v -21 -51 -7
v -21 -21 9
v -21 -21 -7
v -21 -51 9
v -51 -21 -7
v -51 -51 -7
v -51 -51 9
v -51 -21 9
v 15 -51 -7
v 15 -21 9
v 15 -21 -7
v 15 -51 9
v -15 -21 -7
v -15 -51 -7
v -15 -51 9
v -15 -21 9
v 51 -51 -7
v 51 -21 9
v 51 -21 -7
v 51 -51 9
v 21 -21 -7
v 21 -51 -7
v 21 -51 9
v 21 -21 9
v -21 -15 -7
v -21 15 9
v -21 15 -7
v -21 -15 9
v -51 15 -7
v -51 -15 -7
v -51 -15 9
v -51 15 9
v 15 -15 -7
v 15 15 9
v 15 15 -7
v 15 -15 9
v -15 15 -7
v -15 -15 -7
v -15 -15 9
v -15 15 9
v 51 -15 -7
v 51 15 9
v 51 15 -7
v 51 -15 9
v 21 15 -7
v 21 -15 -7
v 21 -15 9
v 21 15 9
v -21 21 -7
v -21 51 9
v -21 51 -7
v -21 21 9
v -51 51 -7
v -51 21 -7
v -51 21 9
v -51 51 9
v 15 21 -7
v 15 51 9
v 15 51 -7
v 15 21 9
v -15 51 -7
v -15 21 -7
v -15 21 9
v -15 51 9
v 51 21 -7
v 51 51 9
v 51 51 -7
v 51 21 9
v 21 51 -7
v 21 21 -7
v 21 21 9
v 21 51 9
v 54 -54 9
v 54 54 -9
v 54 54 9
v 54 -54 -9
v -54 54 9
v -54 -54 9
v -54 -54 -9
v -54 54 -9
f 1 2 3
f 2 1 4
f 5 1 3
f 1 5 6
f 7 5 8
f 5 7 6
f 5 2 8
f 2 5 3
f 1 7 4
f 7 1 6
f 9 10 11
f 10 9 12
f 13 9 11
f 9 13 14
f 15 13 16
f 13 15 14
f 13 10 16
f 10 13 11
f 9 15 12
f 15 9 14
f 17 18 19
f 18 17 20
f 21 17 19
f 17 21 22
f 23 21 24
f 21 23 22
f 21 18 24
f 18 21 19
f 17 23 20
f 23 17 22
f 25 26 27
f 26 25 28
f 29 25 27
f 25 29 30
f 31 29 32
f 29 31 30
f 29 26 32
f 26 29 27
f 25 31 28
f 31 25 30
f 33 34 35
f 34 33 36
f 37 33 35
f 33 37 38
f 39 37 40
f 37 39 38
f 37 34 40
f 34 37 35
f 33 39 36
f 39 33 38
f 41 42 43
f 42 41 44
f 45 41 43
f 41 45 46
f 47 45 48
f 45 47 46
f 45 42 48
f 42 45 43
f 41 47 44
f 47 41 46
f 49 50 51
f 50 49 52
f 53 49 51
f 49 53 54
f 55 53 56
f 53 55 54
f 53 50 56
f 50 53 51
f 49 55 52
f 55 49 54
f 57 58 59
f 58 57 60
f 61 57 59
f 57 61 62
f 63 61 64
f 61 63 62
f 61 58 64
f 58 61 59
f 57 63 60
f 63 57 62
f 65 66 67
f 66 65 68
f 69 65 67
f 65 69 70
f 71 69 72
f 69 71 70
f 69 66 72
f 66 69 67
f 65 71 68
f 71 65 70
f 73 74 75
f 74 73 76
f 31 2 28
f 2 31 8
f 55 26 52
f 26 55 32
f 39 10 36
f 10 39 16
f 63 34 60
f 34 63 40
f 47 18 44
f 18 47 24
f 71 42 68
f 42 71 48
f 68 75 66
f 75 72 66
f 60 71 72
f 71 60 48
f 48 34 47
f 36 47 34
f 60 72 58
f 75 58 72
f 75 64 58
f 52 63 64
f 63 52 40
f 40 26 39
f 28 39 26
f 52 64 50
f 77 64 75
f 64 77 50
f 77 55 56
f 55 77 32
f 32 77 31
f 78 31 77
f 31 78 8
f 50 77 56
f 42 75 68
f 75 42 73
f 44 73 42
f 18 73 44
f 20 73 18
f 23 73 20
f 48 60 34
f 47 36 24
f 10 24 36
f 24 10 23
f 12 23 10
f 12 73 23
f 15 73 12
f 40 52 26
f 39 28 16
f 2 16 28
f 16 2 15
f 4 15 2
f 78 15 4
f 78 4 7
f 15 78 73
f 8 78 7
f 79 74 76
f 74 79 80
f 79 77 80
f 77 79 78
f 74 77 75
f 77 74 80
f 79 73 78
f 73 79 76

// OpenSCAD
$fn = 32;

// ----------------------------------------------------------------------
// Pocket plate 108 x 108 x 18
// 3 x 3 pockets 30 mm square, 16 mm deep
// ----------------------------------------------------------------------

// --- parameters (mm) ---
thickness = 18;  // plate thickness
floor_t = 2;     // material left under each pocket
pocket = 30;     // pocket side length
pitch_x = 36;    // pocket pitch along X
pitch_y = 36;    // pocket pitch along Y
cols = 3;        // pockets per row
rows = 3;        // rows of pockets

// --- derived feature positions (mm) ---
depth = thickness - floor_t;        // = 16   pocket depth, down to the floor
span_x = (cols - 1) * pitch_x;      // = 72   distance between outer pockets
span_y = (rows - 1) * pitch_y;      // = 72   distance between outer pocket rows
origin_x = -span_x / 2;             // = -36   X of the first pocket
origin_y = -span_y / 2;             // = -36   Y of the first pocket
plate = [span_x + pocket + 6, span_y + pocket + 6, thickness];  // = [108, 108, 18]   overall size: pockets plus 3 mm of wall on each side
feature_centers = [
  [origin_x + 0 * pitch_x, origin_y + 0 * pitch_y],
  [origin_x + 1 * pitch_x, origin_y + 0 * pitch_y],
  [origin_x + 2 * pitch_x, origin_y + 0 * pitch_y],
  [origin_x + 0 * pitch_x, origin_y + 1 * pitch_y],
  [origin_x + 1 * pitch_x, origin_y + 1 * pitch_y],
  [origin_x + 2 * pitch_x, origin_y + 1 * pitch_y],
  [origin_x + 0 * pitch_x, origin_y + 2 * pitch_y],
  [origin_x + 1 * pitch_x, origin_y + 2 * pitch_y],
  [origin_x + 2 * pitch_x, origin_y + 2 * pitch_y]
];   // pocket centres, used verbatim by the cutter loop

// plate outline, then one pocket per centre in feature_centers
difference() {
  cube(plate, center = true);
  for (centre = feature_centers)
    translate([centre[0] - pocket / 2, centre[1] - pocket / 2, plate[2] / 2 - depth])
      cube([pocket, pocket, depth + 1]);  // centred on the declared pocket centre
}
